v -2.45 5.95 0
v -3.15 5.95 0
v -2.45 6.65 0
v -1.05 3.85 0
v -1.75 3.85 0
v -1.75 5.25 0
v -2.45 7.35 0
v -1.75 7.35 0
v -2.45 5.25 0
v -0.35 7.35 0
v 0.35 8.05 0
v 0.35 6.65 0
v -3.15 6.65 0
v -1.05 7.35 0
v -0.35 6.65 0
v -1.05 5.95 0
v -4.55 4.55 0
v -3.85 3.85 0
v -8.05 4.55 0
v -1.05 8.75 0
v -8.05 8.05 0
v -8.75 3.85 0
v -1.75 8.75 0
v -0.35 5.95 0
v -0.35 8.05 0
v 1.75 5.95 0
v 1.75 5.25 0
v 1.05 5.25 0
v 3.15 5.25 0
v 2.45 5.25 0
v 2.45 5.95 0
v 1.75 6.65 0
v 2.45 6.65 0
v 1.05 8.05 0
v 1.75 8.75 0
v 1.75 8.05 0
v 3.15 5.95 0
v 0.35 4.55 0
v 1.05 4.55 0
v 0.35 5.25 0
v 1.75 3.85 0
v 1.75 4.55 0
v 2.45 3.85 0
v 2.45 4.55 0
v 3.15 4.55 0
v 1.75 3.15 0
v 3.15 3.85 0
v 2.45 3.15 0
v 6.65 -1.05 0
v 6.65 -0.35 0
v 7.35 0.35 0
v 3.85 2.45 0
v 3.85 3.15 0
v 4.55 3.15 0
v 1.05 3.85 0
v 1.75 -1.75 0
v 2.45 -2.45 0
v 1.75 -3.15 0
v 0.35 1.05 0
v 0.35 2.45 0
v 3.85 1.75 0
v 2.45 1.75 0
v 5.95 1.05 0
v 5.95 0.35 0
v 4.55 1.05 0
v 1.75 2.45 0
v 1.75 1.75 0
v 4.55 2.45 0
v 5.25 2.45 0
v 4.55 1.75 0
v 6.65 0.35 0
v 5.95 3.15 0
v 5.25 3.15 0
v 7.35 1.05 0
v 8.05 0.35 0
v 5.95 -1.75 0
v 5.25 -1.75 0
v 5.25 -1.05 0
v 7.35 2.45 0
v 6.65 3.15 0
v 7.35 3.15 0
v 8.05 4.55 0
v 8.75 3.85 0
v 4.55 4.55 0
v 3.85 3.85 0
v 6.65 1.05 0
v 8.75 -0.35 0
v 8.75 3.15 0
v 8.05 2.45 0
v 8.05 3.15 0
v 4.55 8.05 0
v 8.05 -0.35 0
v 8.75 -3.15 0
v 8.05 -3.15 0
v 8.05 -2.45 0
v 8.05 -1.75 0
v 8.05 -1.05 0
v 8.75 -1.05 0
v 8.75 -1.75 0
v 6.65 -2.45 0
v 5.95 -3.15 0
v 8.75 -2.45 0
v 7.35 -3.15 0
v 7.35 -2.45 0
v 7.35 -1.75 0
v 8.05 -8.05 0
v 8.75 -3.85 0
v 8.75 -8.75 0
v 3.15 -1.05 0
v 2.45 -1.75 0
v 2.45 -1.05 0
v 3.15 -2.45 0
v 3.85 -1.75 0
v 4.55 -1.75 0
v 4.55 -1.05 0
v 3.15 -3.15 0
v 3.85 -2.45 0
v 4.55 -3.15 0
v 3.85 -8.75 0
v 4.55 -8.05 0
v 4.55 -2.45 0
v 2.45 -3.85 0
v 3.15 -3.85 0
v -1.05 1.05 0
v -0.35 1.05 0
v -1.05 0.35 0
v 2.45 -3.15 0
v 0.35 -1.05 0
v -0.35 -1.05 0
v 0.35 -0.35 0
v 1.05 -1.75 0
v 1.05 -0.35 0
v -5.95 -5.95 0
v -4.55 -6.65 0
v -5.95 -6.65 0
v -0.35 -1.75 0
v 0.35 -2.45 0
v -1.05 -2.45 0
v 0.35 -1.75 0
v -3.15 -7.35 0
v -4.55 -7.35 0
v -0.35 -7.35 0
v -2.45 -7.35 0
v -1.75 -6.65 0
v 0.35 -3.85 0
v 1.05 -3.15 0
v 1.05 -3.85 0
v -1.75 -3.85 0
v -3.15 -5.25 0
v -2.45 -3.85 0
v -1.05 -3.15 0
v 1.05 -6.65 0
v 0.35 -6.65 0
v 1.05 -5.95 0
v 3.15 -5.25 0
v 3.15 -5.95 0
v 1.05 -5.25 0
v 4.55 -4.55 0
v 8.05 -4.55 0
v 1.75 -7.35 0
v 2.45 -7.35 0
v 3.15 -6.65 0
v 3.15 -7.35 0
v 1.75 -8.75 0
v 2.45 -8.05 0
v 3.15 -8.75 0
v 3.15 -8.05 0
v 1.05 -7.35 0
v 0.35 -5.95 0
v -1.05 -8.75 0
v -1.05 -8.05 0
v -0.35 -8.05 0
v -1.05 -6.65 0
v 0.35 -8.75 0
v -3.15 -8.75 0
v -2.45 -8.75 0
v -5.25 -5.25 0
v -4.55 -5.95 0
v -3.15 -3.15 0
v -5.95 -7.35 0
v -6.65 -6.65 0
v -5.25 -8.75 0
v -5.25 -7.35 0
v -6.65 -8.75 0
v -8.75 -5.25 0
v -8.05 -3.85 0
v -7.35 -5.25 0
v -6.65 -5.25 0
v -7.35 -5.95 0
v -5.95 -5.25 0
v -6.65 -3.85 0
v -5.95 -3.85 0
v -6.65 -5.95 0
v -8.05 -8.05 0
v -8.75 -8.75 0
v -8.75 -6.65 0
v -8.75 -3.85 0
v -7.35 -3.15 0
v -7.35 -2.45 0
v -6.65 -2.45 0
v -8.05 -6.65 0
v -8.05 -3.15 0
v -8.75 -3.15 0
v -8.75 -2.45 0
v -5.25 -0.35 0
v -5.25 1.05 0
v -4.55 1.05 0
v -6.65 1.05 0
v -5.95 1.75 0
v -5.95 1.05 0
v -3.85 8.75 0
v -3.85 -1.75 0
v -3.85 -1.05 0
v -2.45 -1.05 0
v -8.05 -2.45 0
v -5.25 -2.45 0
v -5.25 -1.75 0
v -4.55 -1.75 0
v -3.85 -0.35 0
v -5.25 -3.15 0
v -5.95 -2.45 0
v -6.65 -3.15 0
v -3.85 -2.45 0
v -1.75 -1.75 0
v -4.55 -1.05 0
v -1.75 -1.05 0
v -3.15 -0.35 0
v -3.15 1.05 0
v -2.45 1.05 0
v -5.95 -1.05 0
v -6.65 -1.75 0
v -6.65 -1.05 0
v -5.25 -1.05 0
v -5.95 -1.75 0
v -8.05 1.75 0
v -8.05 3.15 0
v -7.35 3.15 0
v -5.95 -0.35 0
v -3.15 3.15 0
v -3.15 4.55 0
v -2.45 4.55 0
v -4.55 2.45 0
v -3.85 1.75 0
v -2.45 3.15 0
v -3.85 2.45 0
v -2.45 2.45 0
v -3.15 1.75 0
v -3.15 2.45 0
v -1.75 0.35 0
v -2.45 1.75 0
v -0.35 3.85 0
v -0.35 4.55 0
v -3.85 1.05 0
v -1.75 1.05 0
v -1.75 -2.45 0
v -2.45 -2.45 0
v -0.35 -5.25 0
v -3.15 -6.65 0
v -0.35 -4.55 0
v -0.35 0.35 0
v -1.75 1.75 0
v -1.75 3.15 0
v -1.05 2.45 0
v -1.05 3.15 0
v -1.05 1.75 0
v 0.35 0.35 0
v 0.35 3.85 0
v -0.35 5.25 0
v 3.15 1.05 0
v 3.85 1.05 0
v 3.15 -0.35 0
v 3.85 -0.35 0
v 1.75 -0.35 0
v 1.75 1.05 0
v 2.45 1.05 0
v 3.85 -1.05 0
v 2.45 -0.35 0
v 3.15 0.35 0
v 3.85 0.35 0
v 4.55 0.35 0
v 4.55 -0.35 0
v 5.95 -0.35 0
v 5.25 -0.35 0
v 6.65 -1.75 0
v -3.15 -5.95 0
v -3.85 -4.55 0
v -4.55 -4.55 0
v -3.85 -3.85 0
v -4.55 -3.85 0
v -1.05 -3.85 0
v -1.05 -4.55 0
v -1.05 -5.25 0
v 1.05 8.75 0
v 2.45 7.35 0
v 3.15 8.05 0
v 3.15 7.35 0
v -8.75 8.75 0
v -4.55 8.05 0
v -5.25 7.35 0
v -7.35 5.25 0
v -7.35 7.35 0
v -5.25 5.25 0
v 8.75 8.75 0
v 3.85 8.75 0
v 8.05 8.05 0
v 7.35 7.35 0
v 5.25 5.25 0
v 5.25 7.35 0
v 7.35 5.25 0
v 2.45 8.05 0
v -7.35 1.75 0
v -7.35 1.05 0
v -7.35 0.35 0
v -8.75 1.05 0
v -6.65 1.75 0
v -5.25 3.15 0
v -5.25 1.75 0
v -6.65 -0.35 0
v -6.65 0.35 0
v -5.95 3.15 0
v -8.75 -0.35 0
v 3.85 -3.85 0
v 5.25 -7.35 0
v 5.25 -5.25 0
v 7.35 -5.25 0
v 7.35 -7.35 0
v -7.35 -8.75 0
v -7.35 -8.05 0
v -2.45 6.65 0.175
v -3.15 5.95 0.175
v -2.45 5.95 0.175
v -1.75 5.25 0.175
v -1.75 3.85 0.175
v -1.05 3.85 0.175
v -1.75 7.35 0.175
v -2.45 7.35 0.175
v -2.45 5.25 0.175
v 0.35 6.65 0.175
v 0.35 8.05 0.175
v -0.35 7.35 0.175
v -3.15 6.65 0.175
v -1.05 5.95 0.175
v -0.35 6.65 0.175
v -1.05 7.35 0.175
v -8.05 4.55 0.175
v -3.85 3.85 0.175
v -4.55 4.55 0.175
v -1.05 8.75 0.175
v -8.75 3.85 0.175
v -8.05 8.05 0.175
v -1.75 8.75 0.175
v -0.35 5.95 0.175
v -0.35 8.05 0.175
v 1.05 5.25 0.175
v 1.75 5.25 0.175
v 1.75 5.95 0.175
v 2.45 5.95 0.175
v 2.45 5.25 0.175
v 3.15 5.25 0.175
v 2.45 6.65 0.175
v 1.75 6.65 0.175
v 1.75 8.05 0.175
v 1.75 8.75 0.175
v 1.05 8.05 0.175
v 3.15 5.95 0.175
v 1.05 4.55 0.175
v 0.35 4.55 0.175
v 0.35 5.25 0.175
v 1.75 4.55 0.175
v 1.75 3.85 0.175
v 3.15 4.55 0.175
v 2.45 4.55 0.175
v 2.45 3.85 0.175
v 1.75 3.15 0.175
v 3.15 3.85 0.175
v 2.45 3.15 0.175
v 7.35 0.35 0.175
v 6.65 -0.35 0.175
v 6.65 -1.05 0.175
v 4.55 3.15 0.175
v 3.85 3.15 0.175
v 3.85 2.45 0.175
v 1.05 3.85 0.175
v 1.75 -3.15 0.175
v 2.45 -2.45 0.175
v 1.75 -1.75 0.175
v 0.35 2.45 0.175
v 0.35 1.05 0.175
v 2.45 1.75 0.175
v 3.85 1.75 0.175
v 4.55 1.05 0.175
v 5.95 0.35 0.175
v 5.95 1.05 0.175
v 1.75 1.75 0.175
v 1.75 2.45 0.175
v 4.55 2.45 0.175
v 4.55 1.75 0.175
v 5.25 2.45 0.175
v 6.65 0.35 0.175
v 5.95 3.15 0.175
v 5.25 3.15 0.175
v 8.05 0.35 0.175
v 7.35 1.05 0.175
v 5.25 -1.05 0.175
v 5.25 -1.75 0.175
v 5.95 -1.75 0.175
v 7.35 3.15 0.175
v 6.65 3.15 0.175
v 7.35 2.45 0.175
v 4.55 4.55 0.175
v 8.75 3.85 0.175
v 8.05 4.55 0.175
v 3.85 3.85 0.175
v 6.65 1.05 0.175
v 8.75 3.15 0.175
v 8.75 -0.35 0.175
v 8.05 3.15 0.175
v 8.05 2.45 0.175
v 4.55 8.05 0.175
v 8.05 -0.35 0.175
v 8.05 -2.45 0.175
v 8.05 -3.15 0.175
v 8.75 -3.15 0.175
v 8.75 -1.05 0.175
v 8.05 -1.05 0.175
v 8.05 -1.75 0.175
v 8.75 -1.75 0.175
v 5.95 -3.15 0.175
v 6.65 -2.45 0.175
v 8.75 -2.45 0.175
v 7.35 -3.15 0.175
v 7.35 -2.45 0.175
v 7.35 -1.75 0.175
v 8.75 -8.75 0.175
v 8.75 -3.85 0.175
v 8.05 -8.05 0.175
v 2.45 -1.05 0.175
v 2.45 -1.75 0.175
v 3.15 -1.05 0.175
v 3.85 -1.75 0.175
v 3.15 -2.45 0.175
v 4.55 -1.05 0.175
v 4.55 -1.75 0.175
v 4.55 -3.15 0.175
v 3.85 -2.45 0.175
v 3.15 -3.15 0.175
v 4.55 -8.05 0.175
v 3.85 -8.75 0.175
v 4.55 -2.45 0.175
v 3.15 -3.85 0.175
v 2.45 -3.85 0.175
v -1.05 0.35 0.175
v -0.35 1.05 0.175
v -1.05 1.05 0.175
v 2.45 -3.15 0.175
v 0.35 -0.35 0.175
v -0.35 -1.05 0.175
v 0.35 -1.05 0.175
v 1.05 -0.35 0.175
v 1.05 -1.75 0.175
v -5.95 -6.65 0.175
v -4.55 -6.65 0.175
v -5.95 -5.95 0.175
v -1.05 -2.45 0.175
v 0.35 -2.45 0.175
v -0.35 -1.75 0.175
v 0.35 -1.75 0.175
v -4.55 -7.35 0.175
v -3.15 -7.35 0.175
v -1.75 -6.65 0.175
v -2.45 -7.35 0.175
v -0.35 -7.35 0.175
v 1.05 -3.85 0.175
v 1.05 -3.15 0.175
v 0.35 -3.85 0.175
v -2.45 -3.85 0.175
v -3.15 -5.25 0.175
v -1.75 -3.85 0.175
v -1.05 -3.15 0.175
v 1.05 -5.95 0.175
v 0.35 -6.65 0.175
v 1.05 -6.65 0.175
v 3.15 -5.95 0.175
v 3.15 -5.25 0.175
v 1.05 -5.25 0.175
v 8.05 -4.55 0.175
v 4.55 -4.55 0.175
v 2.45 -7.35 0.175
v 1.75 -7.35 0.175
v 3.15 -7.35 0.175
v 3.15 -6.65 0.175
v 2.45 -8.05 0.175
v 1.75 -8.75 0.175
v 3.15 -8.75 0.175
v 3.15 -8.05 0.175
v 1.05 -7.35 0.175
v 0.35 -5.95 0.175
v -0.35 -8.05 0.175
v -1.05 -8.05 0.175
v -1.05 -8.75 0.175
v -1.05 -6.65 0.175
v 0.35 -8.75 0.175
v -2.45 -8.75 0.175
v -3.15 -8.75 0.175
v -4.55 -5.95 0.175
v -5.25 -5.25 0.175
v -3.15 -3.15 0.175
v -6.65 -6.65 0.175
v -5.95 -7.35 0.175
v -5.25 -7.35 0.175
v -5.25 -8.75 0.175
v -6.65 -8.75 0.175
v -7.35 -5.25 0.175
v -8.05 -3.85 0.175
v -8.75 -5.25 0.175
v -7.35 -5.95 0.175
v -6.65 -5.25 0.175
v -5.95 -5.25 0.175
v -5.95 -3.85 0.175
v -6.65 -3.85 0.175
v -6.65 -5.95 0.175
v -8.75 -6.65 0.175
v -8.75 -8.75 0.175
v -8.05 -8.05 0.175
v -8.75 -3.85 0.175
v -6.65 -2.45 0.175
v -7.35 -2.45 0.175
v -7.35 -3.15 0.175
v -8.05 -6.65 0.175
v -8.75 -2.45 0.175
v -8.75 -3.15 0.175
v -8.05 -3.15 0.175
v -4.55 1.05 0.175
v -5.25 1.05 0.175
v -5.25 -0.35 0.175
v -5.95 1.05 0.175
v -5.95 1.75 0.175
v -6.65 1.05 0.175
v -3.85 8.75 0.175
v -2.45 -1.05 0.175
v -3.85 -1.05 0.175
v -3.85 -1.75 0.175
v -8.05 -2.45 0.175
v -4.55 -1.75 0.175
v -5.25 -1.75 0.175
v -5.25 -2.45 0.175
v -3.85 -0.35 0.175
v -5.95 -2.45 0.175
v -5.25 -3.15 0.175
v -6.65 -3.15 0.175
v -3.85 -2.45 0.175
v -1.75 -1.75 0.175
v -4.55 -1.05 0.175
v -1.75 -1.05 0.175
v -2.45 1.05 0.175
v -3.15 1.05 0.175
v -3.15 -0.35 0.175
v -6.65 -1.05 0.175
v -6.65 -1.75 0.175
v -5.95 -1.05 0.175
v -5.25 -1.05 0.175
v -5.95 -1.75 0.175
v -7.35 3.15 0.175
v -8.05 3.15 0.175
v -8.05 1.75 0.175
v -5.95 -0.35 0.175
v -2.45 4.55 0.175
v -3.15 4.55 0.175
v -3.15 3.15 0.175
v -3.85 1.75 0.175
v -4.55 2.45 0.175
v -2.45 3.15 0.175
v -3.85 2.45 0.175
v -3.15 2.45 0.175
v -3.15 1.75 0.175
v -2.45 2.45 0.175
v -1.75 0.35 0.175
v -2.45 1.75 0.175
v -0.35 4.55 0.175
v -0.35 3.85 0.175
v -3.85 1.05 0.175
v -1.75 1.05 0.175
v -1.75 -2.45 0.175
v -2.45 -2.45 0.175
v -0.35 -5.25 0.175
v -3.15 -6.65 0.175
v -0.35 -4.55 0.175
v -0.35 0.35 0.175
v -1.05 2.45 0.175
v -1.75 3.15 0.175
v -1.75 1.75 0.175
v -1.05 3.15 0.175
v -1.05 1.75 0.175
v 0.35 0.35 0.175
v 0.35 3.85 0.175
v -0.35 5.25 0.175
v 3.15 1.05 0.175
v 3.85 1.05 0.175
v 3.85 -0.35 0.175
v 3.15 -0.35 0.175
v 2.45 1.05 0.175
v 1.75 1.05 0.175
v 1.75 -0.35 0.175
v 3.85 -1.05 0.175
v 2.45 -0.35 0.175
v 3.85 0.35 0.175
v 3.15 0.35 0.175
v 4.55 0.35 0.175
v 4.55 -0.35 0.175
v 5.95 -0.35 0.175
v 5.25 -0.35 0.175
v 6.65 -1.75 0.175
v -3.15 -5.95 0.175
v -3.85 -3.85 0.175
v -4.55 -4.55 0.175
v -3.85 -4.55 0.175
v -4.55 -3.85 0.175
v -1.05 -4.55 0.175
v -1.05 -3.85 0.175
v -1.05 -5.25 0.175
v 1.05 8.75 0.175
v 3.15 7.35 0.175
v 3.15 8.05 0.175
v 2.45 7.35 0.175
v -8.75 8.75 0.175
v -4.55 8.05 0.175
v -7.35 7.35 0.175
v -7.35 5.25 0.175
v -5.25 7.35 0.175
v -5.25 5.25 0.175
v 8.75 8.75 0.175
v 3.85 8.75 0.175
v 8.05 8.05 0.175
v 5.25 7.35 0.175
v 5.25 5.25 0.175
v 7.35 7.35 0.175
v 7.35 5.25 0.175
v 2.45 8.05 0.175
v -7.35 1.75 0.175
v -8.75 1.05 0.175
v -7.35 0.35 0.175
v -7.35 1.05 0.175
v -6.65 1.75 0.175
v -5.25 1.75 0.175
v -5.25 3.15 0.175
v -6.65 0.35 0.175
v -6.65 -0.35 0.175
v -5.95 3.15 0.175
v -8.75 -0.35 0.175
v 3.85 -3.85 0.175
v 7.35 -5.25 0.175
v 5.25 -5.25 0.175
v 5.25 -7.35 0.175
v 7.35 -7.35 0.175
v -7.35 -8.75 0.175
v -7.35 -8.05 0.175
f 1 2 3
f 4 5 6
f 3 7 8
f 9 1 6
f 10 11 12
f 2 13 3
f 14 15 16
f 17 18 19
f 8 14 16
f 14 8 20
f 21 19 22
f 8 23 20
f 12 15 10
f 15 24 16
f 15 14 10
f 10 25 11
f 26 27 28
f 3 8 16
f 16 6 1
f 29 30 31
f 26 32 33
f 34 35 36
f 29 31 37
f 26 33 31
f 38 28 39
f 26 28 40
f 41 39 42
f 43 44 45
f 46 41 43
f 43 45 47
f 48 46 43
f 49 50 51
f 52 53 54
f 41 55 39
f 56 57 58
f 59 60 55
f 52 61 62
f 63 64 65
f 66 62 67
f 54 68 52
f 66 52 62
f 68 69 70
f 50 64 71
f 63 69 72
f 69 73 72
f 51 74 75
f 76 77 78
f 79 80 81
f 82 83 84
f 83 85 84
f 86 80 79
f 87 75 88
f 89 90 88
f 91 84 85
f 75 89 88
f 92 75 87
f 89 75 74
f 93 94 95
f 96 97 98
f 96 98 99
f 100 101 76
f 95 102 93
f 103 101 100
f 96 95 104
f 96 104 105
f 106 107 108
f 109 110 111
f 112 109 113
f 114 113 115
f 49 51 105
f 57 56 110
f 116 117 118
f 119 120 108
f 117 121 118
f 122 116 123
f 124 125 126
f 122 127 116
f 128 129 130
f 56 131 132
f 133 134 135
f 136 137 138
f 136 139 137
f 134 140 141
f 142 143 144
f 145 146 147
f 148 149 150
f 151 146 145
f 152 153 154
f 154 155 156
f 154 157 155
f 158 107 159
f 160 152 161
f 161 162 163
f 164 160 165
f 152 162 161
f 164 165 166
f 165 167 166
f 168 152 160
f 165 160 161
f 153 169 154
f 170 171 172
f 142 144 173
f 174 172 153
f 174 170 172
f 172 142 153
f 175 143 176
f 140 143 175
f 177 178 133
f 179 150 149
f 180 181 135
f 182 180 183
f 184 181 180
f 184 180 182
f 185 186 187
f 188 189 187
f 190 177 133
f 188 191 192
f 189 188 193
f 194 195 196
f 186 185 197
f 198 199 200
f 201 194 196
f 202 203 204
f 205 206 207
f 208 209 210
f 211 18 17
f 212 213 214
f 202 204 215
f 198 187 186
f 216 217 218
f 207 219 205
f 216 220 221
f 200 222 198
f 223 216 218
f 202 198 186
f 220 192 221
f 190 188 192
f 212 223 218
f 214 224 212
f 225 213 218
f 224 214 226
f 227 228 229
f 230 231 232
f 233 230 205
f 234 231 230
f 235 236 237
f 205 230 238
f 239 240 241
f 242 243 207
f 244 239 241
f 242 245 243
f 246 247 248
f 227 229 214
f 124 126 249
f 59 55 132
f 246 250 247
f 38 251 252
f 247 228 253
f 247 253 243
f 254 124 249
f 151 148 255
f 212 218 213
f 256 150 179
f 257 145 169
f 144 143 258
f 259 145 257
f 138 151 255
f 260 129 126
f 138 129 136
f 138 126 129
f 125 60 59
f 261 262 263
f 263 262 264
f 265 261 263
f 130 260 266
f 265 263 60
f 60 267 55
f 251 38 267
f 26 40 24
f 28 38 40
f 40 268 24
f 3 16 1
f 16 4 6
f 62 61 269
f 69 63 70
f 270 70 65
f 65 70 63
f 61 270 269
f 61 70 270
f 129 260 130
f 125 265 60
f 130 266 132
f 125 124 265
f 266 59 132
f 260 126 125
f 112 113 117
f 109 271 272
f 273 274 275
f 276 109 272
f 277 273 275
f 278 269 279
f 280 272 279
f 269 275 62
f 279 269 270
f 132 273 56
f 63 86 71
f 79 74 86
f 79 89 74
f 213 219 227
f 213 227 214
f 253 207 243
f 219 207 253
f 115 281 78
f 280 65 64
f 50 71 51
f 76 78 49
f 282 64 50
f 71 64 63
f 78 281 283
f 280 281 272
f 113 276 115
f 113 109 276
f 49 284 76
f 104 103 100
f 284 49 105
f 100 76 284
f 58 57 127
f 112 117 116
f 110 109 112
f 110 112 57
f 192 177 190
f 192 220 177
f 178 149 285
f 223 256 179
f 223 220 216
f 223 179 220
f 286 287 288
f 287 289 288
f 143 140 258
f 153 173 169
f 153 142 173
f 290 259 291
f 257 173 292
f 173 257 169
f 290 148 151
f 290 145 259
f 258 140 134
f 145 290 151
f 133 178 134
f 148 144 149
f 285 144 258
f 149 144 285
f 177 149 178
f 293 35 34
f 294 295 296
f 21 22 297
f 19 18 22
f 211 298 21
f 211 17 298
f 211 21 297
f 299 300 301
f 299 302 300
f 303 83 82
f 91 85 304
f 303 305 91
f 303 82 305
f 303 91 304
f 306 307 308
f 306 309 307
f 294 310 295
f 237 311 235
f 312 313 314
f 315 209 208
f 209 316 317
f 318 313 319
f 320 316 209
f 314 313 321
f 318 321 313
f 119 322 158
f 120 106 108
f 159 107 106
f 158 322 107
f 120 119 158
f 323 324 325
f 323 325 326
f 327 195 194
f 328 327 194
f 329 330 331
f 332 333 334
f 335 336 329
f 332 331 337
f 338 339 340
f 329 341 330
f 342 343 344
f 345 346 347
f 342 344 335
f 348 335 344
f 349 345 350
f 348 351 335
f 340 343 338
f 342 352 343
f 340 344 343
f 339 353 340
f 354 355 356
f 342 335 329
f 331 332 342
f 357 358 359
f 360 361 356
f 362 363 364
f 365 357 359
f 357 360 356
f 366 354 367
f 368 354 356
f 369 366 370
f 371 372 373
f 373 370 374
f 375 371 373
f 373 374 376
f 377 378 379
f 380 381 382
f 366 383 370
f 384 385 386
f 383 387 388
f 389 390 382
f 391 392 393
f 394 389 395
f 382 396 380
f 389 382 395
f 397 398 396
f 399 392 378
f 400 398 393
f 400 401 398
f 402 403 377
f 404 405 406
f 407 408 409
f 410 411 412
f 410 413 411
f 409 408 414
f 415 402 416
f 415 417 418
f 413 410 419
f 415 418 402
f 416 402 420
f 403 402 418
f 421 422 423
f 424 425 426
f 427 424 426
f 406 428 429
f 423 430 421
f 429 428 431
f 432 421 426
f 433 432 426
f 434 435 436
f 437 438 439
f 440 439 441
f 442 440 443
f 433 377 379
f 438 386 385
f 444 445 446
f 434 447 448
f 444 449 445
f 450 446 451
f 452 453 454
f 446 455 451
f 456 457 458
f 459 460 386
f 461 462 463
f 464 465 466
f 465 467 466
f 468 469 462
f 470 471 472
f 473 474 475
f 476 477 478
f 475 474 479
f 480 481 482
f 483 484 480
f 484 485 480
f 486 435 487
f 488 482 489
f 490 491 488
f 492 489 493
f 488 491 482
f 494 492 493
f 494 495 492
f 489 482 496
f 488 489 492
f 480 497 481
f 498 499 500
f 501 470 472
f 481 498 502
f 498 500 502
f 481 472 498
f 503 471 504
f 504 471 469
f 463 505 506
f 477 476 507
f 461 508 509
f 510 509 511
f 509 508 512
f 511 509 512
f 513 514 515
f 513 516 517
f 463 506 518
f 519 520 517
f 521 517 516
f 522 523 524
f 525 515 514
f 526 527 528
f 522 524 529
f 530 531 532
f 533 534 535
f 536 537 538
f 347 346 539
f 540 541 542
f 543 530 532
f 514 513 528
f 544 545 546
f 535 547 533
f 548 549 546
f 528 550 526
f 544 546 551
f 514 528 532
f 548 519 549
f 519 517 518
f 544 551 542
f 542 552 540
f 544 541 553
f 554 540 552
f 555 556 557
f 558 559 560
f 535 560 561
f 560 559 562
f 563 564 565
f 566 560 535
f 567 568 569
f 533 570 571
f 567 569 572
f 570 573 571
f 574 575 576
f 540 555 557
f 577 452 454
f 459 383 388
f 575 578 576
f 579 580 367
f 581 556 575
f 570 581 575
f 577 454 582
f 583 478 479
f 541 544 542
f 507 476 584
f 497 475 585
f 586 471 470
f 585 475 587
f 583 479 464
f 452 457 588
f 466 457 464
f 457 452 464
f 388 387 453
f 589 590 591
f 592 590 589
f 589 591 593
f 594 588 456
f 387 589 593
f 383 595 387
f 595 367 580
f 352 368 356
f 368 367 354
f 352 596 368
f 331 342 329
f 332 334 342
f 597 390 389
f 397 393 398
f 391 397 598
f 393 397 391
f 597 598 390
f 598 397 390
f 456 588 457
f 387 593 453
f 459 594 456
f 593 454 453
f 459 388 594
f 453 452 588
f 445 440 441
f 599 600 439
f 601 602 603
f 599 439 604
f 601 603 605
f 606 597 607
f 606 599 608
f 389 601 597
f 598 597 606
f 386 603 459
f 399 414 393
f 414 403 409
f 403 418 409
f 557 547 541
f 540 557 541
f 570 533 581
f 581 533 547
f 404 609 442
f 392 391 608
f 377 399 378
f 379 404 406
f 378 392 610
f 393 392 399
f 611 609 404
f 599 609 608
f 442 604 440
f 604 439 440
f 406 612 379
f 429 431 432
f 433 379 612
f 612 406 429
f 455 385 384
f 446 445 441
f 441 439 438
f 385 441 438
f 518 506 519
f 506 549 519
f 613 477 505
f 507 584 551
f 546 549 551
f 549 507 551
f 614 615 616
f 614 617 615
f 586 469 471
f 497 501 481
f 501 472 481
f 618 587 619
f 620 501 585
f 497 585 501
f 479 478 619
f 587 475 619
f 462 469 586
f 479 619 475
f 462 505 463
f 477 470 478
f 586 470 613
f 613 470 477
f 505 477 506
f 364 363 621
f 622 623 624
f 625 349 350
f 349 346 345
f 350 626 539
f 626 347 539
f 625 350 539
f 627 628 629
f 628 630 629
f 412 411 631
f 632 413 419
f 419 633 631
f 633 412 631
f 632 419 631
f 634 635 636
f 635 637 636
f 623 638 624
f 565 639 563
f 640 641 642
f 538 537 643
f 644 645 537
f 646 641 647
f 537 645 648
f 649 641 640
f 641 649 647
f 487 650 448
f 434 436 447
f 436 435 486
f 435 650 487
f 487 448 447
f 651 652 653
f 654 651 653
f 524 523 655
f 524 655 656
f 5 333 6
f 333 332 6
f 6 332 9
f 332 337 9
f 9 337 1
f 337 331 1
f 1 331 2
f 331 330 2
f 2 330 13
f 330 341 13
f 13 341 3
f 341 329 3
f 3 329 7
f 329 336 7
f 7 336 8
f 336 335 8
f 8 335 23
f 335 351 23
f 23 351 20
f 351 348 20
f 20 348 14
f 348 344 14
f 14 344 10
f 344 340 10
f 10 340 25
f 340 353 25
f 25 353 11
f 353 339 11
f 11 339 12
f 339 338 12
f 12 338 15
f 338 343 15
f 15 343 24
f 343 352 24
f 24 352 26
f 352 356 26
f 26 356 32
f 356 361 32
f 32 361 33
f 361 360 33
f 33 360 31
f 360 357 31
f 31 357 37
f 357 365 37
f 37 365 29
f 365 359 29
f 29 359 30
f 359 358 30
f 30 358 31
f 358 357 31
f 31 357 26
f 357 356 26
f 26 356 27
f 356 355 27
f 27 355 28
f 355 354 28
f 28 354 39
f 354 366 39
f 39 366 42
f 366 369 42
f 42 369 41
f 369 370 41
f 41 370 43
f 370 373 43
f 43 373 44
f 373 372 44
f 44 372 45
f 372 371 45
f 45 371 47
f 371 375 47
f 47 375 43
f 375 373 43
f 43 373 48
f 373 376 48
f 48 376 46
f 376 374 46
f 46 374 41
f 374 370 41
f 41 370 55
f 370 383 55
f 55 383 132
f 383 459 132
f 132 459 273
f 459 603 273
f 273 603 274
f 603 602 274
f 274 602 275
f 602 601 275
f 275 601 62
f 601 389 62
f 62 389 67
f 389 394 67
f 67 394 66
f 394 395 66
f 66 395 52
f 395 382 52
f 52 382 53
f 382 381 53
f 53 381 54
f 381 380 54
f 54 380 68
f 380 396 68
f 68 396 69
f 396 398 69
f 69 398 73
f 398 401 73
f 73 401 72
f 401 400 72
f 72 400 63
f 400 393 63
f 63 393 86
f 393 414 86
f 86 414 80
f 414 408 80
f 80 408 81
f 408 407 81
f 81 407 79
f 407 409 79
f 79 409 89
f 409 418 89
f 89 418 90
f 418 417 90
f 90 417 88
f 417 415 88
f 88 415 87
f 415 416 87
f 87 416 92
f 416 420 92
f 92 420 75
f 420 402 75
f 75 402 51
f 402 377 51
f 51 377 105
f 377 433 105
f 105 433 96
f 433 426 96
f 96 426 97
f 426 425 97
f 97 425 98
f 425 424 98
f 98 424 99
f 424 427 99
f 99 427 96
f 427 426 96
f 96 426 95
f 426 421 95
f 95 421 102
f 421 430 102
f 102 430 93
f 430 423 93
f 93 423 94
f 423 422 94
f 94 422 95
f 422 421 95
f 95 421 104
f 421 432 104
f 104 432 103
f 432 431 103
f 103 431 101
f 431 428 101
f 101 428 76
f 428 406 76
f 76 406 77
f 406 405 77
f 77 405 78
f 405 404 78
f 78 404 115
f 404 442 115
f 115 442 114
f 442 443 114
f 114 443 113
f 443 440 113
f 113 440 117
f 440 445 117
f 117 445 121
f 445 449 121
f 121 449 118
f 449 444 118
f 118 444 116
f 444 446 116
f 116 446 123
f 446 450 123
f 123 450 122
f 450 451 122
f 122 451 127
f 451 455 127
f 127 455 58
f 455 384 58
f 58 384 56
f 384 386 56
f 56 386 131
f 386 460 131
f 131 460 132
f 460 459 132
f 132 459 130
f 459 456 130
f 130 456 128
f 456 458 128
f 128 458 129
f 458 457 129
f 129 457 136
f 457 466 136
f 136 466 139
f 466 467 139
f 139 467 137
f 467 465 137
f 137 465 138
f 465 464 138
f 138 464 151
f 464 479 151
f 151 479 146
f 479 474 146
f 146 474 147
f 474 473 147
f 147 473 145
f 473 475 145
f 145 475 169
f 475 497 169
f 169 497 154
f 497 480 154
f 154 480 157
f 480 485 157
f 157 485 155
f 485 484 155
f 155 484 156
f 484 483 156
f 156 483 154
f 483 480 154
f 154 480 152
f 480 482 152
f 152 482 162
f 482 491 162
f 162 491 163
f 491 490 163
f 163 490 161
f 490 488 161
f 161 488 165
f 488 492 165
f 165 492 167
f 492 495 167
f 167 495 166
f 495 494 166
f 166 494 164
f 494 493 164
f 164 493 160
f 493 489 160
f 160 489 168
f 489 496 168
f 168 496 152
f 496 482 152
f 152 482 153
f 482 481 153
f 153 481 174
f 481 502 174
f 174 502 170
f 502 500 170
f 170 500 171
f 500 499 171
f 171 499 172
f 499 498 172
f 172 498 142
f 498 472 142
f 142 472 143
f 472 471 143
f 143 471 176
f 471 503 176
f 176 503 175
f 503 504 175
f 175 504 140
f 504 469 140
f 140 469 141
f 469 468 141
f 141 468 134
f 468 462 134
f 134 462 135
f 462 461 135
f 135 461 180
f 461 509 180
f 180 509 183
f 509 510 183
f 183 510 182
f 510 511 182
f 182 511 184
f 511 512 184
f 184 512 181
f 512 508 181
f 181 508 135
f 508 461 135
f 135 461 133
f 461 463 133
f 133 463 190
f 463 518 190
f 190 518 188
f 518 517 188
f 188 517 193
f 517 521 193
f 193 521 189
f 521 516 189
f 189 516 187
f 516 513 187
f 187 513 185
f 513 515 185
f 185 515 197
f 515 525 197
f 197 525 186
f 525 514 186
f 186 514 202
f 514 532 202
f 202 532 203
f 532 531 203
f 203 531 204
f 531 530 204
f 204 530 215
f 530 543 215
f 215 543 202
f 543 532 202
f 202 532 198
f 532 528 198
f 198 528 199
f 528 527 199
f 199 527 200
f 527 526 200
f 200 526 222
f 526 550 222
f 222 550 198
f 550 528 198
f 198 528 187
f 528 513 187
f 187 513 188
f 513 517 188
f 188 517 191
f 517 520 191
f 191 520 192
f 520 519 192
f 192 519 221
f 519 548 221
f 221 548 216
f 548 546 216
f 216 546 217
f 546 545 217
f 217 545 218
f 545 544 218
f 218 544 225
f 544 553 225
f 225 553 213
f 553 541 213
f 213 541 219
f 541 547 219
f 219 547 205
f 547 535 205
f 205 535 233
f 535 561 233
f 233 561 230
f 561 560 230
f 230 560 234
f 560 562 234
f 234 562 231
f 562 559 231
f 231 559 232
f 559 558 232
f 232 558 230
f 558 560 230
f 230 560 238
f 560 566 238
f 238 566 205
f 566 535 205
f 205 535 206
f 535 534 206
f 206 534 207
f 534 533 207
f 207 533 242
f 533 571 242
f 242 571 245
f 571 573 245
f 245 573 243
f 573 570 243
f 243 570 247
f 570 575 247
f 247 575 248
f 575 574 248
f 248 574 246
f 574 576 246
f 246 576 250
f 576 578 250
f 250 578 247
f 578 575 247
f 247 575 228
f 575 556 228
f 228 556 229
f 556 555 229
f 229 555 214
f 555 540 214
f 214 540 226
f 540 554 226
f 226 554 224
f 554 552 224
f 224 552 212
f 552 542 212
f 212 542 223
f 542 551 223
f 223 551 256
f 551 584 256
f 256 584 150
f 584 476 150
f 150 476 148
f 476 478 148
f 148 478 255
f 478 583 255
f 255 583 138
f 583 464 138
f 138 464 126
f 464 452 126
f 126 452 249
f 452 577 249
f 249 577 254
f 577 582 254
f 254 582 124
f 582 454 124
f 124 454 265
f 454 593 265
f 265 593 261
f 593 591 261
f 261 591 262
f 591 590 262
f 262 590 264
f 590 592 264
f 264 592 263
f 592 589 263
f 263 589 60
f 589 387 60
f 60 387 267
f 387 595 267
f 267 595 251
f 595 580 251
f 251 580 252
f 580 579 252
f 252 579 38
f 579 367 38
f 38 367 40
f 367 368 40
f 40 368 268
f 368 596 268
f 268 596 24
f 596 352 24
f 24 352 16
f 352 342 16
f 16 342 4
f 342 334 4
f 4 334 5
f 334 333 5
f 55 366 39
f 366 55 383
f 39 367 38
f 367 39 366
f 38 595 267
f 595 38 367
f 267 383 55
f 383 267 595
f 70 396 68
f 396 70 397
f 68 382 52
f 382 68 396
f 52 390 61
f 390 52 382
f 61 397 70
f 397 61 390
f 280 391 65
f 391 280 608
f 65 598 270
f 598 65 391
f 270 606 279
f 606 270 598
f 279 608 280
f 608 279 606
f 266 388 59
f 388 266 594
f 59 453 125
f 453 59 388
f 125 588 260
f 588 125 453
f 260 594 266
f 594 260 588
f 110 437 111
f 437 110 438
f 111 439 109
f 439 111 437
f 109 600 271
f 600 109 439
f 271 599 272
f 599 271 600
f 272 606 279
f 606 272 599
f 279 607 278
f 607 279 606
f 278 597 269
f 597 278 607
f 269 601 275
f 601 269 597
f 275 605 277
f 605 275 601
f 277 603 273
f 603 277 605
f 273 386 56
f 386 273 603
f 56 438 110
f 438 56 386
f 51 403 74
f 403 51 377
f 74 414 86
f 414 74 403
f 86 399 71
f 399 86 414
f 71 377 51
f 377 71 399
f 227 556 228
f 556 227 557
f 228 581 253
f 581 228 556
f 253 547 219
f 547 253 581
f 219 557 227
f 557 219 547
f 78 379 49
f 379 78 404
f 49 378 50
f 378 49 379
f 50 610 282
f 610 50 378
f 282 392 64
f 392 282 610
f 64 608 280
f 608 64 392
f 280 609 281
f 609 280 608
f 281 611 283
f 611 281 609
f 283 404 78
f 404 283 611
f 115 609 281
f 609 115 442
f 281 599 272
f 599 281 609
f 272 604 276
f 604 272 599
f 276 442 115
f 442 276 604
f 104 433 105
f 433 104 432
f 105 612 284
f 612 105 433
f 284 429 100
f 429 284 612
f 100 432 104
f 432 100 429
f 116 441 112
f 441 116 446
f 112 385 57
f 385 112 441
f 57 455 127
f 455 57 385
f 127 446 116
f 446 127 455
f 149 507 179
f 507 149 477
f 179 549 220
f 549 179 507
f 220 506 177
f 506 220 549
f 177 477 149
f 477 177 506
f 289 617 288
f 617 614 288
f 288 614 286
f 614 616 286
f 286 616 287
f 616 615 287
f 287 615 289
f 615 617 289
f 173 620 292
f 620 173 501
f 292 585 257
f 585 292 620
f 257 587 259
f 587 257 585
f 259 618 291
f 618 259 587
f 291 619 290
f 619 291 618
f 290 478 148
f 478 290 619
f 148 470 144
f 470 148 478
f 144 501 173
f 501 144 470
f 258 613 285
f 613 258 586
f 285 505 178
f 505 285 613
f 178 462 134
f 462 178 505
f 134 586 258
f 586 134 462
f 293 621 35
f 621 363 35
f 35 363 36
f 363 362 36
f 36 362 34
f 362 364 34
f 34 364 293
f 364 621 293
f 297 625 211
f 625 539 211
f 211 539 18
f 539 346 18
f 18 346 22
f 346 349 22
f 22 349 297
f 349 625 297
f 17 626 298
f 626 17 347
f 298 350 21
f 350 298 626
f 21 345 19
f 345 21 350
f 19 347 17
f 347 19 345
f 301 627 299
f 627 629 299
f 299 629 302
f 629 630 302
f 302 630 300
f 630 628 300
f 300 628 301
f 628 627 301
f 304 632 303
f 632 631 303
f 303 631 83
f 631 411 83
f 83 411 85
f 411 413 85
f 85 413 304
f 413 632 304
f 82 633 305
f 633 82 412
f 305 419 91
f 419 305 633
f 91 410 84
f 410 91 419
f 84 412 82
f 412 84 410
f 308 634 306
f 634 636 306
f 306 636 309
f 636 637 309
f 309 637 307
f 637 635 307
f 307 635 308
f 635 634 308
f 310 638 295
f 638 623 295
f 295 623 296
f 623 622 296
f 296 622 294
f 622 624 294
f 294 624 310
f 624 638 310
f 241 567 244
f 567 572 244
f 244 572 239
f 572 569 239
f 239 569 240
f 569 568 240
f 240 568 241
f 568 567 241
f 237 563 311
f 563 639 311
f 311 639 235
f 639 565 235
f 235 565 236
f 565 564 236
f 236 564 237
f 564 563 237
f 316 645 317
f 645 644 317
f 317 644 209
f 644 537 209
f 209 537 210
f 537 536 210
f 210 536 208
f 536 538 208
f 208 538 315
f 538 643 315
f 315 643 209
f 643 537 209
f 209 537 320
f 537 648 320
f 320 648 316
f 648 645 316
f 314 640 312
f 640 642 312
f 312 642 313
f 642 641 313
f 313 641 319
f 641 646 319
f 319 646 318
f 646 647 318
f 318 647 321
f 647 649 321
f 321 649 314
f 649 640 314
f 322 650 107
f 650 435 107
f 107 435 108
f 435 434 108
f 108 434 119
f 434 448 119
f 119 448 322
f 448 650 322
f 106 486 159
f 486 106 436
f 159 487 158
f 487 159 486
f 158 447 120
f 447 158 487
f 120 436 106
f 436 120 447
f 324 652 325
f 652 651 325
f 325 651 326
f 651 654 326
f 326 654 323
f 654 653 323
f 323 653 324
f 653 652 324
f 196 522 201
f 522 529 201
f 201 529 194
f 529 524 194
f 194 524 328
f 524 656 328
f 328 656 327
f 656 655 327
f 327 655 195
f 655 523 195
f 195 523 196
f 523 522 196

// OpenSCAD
include <qr.scad>
puckRadius = 35 / 2;
translate([0,0,0])
  scale(puckRadius/100)
    mirror([1,0,0])
      qr("https://puck.wollivan.dev", center=true);
